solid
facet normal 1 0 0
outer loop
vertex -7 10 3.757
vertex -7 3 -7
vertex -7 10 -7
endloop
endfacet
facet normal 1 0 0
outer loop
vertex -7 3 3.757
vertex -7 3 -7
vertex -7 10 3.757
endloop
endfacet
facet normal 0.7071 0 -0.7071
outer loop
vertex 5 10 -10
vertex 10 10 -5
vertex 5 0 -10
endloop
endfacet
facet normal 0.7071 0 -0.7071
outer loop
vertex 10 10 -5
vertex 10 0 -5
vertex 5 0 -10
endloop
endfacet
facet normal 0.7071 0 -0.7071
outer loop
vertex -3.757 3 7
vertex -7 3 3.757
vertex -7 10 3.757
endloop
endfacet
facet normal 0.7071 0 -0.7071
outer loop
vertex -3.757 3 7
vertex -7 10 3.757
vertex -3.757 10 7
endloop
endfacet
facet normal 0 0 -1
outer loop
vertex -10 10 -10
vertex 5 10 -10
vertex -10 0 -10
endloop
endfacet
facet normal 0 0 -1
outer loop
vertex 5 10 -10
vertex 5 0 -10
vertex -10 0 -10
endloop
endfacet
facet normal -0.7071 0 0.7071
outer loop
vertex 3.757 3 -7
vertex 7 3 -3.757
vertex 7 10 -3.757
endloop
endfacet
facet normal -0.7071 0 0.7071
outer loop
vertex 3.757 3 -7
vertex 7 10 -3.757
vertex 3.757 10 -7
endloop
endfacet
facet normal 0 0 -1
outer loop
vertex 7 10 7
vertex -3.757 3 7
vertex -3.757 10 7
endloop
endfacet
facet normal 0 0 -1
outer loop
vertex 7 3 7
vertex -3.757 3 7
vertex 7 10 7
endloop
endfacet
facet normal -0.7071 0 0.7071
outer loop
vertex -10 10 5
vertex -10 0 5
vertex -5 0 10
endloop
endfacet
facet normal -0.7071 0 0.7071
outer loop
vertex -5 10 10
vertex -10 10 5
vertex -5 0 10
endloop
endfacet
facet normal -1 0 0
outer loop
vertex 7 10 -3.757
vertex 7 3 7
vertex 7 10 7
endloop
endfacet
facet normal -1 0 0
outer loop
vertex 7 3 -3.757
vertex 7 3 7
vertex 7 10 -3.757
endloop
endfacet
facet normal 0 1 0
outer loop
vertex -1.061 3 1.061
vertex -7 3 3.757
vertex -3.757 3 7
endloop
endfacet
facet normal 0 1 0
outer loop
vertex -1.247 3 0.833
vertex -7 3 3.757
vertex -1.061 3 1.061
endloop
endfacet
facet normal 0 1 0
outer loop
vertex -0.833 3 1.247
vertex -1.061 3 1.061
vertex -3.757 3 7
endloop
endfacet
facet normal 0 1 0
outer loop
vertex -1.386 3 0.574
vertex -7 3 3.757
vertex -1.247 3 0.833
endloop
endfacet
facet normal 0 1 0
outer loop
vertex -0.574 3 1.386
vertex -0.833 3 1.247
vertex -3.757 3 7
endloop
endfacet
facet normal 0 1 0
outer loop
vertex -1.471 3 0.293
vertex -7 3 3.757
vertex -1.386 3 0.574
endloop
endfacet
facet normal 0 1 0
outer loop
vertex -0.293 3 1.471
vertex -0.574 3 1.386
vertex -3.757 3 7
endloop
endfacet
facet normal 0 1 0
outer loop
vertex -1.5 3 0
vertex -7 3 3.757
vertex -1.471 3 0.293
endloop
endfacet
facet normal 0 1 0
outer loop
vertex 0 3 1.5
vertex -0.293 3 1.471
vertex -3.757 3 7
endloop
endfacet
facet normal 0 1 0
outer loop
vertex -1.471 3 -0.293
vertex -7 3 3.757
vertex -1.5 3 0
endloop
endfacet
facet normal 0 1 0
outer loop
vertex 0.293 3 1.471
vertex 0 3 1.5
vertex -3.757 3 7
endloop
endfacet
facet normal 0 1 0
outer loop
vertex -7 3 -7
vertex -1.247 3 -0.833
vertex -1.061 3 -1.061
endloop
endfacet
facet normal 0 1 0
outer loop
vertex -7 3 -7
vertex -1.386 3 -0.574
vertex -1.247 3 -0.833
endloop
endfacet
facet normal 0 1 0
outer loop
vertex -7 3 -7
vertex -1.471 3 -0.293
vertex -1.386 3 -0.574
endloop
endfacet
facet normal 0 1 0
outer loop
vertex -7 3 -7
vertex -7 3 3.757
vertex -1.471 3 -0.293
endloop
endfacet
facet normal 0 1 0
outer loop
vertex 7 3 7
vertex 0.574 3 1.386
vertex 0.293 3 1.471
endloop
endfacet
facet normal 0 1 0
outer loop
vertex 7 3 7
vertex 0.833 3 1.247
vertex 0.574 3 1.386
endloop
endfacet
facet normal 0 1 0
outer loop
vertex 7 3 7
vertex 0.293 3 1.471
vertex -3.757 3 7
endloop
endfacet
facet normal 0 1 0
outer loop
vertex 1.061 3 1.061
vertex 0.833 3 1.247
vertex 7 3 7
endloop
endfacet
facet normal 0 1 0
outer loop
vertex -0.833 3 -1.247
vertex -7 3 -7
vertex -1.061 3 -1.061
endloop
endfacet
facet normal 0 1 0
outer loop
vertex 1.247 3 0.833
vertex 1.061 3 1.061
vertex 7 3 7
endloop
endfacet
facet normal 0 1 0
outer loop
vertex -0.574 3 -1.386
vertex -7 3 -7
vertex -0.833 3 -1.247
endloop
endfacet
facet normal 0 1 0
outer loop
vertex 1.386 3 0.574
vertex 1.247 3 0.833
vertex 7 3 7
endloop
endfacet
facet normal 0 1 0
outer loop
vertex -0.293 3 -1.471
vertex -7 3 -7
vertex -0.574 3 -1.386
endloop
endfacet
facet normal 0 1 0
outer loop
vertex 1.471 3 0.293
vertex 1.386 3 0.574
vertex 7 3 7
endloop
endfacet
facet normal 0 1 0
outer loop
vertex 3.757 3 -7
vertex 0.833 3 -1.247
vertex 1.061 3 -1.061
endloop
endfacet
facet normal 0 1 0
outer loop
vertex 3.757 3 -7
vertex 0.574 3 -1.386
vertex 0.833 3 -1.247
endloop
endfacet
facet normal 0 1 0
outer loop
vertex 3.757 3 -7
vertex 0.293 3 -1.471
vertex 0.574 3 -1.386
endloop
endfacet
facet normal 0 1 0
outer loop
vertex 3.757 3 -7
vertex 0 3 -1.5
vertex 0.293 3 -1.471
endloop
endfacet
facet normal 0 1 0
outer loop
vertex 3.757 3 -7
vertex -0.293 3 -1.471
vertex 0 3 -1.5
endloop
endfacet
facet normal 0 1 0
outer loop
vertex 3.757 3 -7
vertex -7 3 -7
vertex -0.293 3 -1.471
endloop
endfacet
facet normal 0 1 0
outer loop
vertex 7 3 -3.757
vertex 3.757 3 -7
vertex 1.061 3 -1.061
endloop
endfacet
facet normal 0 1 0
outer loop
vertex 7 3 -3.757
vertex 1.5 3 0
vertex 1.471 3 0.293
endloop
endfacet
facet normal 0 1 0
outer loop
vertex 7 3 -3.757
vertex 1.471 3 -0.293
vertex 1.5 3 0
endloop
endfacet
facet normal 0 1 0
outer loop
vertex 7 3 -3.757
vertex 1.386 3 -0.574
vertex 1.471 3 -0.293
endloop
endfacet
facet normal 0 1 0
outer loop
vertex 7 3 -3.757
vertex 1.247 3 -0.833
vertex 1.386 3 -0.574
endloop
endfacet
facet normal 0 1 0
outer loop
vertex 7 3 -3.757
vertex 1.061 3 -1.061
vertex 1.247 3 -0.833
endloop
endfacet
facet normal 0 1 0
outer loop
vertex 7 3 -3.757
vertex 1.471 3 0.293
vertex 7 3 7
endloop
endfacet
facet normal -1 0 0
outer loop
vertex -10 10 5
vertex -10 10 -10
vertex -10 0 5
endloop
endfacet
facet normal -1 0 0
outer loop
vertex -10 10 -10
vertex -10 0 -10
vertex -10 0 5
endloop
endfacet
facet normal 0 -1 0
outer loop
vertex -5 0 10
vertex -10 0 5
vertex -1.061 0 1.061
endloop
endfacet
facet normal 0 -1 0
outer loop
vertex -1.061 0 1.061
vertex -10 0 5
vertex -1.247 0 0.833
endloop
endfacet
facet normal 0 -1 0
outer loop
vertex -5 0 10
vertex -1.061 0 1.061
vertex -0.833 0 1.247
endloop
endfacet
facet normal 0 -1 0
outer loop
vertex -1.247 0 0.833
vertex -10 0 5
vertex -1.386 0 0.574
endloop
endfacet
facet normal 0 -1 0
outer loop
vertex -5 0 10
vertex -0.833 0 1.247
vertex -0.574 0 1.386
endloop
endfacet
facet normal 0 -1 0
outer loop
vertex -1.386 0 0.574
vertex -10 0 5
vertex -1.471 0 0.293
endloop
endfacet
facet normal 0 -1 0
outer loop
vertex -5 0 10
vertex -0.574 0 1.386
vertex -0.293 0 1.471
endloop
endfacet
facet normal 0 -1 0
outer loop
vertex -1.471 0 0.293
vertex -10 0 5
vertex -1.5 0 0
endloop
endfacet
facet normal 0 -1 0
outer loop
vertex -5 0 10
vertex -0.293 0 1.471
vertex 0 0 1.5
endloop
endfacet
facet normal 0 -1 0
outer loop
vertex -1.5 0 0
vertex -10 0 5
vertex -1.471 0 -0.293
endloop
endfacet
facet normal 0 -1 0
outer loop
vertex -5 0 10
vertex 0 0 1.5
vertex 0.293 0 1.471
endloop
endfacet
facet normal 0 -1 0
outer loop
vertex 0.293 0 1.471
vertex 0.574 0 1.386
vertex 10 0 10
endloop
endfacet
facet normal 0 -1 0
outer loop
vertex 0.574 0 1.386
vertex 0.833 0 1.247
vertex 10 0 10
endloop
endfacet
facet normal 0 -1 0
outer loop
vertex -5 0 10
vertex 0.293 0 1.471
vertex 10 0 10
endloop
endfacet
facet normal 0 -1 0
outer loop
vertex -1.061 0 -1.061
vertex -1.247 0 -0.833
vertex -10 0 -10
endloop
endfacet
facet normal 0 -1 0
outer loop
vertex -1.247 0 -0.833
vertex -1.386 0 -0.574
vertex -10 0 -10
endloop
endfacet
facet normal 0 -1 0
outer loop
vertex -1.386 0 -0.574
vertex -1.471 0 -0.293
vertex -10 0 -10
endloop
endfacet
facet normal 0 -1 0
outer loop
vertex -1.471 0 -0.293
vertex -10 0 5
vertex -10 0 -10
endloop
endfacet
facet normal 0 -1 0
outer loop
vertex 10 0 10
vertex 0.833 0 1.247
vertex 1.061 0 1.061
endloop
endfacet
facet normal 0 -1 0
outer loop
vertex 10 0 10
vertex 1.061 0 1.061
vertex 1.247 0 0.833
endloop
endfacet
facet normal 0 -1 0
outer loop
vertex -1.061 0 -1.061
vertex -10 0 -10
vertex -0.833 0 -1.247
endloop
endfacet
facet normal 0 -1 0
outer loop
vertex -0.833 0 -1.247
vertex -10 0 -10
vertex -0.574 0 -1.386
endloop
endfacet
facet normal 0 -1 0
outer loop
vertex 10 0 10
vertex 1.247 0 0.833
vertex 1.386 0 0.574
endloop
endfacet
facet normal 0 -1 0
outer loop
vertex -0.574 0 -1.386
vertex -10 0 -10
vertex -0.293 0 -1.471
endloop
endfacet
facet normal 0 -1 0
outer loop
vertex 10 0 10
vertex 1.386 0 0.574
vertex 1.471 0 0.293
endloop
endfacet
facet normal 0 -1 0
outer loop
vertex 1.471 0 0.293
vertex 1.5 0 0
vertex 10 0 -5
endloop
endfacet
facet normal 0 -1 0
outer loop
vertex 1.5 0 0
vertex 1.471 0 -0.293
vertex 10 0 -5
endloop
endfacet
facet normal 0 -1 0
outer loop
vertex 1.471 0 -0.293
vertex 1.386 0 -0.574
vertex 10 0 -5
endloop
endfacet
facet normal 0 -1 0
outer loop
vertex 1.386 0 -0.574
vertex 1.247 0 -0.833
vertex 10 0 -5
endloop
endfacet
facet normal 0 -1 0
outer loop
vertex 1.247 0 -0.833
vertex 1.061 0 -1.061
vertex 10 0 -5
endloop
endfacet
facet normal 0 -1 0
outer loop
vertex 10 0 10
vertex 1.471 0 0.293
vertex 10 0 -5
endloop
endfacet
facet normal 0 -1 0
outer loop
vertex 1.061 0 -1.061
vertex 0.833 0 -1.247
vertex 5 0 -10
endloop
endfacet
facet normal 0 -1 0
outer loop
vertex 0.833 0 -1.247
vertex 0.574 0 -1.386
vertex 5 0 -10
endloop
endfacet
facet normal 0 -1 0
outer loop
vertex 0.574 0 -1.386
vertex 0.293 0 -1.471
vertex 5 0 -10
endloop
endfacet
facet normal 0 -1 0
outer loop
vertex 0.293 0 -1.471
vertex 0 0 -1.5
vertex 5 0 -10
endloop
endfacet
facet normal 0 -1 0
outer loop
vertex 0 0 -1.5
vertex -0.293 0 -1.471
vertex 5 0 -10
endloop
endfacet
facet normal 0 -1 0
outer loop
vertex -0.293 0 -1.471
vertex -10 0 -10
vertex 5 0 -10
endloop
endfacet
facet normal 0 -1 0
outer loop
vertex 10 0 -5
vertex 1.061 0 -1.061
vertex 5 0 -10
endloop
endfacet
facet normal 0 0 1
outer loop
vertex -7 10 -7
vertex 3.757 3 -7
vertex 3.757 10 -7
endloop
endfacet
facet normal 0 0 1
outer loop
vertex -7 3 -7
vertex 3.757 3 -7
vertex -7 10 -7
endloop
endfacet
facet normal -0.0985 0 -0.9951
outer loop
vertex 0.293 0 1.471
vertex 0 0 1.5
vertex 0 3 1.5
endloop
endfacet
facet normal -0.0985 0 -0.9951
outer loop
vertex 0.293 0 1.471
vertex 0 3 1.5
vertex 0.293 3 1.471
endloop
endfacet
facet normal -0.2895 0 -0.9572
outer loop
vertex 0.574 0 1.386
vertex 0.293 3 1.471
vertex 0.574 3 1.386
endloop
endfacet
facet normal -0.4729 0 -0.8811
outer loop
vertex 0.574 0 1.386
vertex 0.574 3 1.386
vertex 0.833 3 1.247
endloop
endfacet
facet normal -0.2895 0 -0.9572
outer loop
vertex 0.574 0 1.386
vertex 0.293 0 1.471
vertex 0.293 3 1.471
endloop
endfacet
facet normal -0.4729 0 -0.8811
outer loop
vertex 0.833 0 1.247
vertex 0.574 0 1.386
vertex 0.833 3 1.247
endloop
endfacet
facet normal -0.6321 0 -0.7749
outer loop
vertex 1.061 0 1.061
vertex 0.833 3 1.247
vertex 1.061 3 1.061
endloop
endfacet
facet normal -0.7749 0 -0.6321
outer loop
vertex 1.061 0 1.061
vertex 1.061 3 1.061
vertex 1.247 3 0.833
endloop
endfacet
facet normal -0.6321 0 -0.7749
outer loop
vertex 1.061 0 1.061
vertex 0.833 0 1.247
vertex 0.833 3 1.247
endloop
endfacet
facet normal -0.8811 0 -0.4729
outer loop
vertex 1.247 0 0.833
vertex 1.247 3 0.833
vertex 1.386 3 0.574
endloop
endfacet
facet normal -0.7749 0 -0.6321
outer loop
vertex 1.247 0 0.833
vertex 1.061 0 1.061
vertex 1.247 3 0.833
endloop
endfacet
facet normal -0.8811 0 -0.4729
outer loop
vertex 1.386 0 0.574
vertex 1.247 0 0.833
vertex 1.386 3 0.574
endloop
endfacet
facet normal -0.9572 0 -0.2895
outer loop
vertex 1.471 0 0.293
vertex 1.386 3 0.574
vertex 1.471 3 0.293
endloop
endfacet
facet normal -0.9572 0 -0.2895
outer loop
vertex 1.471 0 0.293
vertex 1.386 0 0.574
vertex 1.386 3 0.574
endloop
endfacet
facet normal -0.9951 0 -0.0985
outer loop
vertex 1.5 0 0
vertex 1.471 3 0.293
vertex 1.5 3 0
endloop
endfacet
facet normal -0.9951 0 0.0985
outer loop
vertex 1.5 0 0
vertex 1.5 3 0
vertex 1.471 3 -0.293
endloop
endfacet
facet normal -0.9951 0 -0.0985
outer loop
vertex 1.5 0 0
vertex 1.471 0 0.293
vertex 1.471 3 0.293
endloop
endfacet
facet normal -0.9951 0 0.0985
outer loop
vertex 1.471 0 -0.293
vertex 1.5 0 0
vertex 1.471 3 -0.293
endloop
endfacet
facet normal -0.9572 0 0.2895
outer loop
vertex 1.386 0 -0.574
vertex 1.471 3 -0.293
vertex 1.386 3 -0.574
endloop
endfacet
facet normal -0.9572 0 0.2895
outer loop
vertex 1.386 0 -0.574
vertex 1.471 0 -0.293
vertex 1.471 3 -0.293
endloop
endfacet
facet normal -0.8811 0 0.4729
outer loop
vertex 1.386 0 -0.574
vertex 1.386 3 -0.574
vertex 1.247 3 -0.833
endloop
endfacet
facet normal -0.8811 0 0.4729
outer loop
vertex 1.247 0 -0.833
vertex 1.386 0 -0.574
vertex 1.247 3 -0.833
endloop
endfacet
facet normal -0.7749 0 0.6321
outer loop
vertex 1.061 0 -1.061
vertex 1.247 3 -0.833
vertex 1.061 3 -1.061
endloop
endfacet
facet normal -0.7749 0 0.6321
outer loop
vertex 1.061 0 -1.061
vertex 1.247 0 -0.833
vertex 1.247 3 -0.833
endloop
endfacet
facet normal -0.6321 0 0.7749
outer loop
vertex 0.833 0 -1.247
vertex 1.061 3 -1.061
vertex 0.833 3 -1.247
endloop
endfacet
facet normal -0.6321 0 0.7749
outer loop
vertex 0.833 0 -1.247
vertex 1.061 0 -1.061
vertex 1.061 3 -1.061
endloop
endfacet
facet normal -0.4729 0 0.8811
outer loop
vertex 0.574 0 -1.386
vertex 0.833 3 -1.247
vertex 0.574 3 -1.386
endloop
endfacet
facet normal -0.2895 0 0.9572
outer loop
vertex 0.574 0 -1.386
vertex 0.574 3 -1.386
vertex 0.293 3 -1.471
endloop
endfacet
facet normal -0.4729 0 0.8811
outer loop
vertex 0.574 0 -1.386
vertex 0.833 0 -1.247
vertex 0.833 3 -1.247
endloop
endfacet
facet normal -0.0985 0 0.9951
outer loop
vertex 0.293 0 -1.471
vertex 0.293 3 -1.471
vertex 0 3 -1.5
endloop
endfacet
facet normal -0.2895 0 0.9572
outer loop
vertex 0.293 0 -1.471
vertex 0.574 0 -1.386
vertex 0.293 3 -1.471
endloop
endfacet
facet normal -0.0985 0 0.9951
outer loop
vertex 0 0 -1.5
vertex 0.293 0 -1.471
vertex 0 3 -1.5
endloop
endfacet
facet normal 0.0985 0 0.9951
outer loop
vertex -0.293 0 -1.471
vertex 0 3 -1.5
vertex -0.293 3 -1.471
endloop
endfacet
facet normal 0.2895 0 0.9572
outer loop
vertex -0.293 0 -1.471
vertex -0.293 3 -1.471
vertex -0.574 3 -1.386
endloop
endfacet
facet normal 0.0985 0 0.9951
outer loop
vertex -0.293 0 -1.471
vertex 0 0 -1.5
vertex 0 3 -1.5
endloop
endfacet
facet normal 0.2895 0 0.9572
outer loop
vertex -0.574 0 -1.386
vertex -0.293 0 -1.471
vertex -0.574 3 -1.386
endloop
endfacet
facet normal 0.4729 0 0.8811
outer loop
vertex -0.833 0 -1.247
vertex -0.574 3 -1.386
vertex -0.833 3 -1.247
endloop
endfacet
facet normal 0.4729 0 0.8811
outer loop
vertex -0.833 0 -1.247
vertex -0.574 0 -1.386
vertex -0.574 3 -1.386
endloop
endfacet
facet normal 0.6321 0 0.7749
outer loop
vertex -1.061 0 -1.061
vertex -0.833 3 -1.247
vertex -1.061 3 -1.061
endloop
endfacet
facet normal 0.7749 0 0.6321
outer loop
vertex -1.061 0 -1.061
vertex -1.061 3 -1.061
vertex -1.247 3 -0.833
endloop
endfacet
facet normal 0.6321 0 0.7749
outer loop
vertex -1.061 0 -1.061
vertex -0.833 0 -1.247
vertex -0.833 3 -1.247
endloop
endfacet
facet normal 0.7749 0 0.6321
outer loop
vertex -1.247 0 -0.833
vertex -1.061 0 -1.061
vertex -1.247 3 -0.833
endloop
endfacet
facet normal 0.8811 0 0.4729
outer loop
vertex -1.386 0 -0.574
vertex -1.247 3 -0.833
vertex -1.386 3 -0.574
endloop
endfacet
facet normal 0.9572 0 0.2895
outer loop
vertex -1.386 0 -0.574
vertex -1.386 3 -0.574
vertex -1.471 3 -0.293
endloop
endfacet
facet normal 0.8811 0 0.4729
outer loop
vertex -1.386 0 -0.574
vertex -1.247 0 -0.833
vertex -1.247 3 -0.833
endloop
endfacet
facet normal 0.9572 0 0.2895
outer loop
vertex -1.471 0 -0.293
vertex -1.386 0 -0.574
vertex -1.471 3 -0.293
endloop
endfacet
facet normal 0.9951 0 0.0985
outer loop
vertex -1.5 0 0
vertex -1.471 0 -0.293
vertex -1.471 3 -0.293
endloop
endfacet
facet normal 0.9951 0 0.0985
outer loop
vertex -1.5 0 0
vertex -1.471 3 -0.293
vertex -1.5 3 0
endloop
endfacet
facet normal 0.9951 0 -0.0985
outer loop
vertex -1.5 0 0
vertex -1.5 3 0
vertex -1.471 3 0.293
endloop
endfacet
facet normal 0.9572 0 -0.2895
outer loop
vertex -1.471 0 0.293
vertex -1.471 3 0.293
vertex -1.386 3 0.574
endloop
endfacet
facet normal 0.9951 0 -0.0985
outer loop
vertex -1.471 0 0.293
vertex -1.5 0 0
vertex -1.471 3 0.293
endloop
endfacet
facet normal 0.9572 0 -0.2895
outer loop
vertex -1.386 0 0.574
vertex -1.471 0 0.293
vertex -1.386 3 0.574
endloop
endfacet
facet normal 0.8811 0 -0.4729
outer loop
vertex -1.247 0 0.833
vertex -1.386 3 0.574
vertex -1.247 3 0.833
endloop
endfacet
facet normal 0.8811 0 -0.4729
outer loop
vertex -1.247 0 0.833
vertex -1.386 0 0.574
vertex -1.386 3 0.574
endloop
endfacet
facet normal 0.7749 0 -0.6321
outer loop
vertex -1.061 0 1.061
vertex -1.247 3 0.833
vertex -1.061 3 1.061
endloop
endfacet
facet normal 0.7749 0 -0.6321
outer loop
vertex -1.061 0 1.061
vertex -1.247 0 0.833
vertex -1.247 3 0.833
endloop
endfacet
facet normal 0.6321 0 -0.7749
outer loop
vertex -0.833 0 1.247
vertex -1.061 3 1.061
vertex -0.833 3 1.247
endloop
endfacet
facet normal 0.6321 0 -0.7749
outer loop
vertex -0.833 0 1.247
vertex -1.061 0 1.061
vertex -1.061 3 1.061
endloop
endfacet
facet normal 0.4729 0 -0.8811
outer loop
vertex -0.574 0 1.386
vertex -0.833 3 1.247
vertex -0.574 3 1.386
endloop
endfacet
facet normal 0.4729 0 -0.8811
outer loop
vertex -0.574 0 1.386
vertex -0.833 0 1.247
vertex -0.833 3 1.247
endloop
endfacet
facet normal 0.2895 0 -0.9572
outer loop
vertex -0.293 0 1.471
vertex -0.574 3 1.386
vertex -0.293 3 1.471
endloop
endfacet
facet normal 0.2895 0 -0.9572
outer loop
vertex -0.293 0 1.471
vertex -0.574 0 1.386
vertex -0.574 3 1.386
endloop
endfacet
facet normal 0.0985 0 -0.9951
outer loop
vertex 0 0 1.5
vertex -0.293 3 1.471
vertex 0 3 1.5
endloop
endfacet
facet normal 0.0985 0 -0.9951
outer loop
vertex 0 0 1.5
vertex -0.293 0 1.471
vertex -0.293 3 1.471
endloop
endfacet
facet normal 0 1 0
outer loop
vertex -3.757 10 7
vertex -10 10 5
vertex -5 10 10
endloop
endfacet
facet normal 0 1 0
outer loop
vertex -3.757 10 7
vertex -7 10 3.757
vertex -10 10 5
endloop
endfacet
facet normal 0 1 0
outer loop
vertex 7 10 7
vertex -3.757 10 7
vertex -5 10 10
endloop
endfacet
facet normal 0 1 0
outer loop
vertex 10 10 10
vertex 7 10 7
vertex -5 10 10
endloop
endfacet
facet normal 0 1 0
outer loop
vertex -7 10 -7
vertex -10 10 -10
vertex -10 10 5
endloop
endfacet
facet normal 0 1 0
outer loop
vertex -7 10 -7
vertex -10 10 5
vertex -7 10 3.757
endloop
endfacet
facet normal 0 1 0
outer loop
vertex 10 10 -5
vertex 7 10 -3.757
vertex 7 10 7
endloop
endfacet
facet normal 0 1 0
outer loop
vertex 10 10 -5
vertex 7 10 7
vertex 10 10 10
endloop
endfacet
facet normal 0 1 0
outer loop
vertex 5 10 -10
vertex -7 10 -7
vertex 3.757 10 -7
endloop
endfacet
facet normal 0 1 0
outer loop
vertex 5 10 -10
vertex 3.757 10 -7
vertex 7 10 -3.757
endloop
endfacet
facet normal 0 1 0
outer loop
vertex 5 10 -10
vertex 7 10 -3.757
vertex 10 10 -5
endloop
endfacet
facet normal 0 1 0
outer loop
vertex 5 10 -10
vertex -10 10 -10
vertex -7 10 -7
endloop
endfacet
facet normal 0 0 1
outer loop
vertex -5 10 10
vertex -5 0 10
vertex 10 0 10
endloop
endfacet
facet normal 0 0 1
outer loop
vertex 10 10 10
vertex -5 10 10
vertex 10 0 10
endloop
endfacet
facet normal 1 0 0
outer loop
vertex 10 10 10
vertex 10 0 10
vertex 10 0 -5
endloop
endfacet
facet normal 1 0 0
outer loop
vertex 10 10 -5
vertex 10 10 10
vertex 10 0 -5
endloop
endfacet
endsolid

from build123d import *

# Parameters (mm, degrees)
SKETCH_1_W      = 20
SKETCH_1_H      = 20
SKETCH_1_R      = 1.5
EXTRUDE_1_DEPTH = 3
CHAMFER_1_SIZE  = 5
EXTRUDE_2_DEPTH = 7


with BuildPart() as part:
    # 草图1 → 凸台-拉伸1 (new body)
    with BuildSketch(Plane(origin=(0, 0, 0), x_dir=(1, 0, 0), z_dir=(0, 1, 0))):
        Rectangle(SKETCH_1_W, SKETCH_1_H)
        with Locations(Location((0, 0, 0), (0, 0, 270))):
            Circle(SKETCH_1_R, mode=Mode.SUBTRACT)
    extrude(amount=EXTRUDE_1_DEPTH)

    # 倒角1
    chamfer_1_edges = [part.edges().sort_by_distance(p)[0] for p in [
        (-10, 1.5, 10),
        (10, 1.5, -10),
    ]]
    chamfer(chamfer_1_edges, length=CHAMFER_1_SIZE)

    # 草图2 → 凸台-拉伸2 (add)
    with BuildSketch(Plane(origin=(0, 3, 0), x_dir=(1, 0, 0), z_dir=(0, 1, 0))):
        Polygon((10, -10), (10, 5), (5, 10), (-10, 10), (-10, -5), (-5, -10), align=None)
        Polygon((-7, 7), (-7, -3.757359313), (-3.757359313, -7), (7, -7), (7, 3.757359313), (3.757359313, 7), align=None, mode=Mode.SUBTRACT)
    extrude(amount=EXTRUDE_2_DEPTH)


solid = part.part
